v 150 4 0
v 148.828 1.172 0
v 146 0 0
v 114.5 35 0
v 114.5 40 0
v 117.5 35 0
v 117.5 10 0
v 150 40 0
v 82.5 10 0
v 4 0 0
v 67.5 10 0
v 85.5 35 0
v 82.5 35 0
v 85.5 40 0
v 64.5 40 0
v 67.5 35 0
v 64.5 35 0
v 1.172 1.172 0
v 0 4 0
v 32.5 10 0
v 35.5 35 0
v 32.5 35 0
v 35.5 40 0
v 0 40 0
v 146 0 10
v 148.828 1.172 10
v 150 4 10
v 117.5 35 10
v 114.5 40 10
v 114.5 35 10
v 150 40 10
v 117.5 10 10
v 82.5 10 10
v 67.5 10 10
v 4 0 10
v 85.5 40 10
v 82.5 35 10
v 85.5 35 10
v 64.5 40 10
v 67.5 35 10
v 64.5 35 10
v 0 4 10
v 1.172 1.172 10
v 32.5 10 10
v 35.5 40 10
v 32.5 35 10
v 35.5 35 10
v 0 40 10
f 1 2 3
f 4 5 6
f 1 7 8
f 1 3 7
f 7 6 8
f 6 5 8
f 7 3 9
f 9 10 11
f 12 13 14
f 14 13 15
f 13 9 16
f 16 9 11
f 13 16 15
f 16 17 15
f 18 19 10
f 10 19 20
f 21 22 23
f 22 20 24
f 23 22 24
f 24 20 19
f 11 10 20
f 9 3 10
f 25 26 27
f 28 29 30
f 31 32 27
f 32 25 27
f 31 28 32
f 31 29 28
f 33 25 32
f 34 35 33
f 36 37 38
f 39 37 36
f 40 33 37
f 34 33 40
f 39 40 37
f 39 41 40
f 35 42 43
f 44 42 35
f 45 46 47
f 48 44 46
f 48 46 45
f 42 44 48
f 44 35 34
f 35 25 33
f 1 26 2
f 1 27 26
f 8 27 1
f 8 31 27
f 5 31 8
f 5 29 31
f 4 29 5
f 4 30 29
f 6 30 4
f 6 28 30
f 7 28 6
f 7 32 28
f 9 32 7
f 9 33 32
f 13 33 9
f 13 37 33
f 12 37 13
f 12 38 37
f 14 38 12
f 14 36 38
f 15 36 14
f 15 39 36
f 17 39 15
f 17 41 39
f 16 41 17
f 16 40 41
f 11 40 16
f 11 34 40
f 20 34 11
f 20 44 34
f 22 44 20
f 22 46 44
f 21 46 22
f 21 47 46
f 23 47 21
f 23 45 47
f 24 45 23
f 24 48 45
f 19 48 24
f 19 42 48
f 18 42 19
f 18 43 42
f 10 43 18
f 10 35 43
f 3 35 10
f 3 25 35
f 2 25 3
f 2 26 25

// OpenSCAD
$fn = 32;

// ----------------------------------------------------------------------
// Oversize slot bar: 150 mm bar with 2 oversize windows
// ----------------------------------------------------------------------

// --- parameters (mm) ---
profile_height = 10;      // extrusion height
profile_points = 24;      // points of the closed outline

profile = [[0, 4], [1.172, 1.172], [4, 0], [146, 0], [148.828, 1.172], [150, 4], [150, 40], [114.5, 40], [114.5, 35], [117.5, 35], [117.5, 10], [82.5, 10], [82.5, 35], [85.5, 35], [85.5, 40], [64.5, 40], [64.5, 35], [67.5, 35], [67.5, 10], [32.5, 10], [32.5, 35], [35.5, 35], [35.5, 40], [0, 40]];  // single closed polygon, 24 points, counter clockwise

// --- the one profile operation ---
linear_extrude(height = profile_height) polygon(points = profile);
